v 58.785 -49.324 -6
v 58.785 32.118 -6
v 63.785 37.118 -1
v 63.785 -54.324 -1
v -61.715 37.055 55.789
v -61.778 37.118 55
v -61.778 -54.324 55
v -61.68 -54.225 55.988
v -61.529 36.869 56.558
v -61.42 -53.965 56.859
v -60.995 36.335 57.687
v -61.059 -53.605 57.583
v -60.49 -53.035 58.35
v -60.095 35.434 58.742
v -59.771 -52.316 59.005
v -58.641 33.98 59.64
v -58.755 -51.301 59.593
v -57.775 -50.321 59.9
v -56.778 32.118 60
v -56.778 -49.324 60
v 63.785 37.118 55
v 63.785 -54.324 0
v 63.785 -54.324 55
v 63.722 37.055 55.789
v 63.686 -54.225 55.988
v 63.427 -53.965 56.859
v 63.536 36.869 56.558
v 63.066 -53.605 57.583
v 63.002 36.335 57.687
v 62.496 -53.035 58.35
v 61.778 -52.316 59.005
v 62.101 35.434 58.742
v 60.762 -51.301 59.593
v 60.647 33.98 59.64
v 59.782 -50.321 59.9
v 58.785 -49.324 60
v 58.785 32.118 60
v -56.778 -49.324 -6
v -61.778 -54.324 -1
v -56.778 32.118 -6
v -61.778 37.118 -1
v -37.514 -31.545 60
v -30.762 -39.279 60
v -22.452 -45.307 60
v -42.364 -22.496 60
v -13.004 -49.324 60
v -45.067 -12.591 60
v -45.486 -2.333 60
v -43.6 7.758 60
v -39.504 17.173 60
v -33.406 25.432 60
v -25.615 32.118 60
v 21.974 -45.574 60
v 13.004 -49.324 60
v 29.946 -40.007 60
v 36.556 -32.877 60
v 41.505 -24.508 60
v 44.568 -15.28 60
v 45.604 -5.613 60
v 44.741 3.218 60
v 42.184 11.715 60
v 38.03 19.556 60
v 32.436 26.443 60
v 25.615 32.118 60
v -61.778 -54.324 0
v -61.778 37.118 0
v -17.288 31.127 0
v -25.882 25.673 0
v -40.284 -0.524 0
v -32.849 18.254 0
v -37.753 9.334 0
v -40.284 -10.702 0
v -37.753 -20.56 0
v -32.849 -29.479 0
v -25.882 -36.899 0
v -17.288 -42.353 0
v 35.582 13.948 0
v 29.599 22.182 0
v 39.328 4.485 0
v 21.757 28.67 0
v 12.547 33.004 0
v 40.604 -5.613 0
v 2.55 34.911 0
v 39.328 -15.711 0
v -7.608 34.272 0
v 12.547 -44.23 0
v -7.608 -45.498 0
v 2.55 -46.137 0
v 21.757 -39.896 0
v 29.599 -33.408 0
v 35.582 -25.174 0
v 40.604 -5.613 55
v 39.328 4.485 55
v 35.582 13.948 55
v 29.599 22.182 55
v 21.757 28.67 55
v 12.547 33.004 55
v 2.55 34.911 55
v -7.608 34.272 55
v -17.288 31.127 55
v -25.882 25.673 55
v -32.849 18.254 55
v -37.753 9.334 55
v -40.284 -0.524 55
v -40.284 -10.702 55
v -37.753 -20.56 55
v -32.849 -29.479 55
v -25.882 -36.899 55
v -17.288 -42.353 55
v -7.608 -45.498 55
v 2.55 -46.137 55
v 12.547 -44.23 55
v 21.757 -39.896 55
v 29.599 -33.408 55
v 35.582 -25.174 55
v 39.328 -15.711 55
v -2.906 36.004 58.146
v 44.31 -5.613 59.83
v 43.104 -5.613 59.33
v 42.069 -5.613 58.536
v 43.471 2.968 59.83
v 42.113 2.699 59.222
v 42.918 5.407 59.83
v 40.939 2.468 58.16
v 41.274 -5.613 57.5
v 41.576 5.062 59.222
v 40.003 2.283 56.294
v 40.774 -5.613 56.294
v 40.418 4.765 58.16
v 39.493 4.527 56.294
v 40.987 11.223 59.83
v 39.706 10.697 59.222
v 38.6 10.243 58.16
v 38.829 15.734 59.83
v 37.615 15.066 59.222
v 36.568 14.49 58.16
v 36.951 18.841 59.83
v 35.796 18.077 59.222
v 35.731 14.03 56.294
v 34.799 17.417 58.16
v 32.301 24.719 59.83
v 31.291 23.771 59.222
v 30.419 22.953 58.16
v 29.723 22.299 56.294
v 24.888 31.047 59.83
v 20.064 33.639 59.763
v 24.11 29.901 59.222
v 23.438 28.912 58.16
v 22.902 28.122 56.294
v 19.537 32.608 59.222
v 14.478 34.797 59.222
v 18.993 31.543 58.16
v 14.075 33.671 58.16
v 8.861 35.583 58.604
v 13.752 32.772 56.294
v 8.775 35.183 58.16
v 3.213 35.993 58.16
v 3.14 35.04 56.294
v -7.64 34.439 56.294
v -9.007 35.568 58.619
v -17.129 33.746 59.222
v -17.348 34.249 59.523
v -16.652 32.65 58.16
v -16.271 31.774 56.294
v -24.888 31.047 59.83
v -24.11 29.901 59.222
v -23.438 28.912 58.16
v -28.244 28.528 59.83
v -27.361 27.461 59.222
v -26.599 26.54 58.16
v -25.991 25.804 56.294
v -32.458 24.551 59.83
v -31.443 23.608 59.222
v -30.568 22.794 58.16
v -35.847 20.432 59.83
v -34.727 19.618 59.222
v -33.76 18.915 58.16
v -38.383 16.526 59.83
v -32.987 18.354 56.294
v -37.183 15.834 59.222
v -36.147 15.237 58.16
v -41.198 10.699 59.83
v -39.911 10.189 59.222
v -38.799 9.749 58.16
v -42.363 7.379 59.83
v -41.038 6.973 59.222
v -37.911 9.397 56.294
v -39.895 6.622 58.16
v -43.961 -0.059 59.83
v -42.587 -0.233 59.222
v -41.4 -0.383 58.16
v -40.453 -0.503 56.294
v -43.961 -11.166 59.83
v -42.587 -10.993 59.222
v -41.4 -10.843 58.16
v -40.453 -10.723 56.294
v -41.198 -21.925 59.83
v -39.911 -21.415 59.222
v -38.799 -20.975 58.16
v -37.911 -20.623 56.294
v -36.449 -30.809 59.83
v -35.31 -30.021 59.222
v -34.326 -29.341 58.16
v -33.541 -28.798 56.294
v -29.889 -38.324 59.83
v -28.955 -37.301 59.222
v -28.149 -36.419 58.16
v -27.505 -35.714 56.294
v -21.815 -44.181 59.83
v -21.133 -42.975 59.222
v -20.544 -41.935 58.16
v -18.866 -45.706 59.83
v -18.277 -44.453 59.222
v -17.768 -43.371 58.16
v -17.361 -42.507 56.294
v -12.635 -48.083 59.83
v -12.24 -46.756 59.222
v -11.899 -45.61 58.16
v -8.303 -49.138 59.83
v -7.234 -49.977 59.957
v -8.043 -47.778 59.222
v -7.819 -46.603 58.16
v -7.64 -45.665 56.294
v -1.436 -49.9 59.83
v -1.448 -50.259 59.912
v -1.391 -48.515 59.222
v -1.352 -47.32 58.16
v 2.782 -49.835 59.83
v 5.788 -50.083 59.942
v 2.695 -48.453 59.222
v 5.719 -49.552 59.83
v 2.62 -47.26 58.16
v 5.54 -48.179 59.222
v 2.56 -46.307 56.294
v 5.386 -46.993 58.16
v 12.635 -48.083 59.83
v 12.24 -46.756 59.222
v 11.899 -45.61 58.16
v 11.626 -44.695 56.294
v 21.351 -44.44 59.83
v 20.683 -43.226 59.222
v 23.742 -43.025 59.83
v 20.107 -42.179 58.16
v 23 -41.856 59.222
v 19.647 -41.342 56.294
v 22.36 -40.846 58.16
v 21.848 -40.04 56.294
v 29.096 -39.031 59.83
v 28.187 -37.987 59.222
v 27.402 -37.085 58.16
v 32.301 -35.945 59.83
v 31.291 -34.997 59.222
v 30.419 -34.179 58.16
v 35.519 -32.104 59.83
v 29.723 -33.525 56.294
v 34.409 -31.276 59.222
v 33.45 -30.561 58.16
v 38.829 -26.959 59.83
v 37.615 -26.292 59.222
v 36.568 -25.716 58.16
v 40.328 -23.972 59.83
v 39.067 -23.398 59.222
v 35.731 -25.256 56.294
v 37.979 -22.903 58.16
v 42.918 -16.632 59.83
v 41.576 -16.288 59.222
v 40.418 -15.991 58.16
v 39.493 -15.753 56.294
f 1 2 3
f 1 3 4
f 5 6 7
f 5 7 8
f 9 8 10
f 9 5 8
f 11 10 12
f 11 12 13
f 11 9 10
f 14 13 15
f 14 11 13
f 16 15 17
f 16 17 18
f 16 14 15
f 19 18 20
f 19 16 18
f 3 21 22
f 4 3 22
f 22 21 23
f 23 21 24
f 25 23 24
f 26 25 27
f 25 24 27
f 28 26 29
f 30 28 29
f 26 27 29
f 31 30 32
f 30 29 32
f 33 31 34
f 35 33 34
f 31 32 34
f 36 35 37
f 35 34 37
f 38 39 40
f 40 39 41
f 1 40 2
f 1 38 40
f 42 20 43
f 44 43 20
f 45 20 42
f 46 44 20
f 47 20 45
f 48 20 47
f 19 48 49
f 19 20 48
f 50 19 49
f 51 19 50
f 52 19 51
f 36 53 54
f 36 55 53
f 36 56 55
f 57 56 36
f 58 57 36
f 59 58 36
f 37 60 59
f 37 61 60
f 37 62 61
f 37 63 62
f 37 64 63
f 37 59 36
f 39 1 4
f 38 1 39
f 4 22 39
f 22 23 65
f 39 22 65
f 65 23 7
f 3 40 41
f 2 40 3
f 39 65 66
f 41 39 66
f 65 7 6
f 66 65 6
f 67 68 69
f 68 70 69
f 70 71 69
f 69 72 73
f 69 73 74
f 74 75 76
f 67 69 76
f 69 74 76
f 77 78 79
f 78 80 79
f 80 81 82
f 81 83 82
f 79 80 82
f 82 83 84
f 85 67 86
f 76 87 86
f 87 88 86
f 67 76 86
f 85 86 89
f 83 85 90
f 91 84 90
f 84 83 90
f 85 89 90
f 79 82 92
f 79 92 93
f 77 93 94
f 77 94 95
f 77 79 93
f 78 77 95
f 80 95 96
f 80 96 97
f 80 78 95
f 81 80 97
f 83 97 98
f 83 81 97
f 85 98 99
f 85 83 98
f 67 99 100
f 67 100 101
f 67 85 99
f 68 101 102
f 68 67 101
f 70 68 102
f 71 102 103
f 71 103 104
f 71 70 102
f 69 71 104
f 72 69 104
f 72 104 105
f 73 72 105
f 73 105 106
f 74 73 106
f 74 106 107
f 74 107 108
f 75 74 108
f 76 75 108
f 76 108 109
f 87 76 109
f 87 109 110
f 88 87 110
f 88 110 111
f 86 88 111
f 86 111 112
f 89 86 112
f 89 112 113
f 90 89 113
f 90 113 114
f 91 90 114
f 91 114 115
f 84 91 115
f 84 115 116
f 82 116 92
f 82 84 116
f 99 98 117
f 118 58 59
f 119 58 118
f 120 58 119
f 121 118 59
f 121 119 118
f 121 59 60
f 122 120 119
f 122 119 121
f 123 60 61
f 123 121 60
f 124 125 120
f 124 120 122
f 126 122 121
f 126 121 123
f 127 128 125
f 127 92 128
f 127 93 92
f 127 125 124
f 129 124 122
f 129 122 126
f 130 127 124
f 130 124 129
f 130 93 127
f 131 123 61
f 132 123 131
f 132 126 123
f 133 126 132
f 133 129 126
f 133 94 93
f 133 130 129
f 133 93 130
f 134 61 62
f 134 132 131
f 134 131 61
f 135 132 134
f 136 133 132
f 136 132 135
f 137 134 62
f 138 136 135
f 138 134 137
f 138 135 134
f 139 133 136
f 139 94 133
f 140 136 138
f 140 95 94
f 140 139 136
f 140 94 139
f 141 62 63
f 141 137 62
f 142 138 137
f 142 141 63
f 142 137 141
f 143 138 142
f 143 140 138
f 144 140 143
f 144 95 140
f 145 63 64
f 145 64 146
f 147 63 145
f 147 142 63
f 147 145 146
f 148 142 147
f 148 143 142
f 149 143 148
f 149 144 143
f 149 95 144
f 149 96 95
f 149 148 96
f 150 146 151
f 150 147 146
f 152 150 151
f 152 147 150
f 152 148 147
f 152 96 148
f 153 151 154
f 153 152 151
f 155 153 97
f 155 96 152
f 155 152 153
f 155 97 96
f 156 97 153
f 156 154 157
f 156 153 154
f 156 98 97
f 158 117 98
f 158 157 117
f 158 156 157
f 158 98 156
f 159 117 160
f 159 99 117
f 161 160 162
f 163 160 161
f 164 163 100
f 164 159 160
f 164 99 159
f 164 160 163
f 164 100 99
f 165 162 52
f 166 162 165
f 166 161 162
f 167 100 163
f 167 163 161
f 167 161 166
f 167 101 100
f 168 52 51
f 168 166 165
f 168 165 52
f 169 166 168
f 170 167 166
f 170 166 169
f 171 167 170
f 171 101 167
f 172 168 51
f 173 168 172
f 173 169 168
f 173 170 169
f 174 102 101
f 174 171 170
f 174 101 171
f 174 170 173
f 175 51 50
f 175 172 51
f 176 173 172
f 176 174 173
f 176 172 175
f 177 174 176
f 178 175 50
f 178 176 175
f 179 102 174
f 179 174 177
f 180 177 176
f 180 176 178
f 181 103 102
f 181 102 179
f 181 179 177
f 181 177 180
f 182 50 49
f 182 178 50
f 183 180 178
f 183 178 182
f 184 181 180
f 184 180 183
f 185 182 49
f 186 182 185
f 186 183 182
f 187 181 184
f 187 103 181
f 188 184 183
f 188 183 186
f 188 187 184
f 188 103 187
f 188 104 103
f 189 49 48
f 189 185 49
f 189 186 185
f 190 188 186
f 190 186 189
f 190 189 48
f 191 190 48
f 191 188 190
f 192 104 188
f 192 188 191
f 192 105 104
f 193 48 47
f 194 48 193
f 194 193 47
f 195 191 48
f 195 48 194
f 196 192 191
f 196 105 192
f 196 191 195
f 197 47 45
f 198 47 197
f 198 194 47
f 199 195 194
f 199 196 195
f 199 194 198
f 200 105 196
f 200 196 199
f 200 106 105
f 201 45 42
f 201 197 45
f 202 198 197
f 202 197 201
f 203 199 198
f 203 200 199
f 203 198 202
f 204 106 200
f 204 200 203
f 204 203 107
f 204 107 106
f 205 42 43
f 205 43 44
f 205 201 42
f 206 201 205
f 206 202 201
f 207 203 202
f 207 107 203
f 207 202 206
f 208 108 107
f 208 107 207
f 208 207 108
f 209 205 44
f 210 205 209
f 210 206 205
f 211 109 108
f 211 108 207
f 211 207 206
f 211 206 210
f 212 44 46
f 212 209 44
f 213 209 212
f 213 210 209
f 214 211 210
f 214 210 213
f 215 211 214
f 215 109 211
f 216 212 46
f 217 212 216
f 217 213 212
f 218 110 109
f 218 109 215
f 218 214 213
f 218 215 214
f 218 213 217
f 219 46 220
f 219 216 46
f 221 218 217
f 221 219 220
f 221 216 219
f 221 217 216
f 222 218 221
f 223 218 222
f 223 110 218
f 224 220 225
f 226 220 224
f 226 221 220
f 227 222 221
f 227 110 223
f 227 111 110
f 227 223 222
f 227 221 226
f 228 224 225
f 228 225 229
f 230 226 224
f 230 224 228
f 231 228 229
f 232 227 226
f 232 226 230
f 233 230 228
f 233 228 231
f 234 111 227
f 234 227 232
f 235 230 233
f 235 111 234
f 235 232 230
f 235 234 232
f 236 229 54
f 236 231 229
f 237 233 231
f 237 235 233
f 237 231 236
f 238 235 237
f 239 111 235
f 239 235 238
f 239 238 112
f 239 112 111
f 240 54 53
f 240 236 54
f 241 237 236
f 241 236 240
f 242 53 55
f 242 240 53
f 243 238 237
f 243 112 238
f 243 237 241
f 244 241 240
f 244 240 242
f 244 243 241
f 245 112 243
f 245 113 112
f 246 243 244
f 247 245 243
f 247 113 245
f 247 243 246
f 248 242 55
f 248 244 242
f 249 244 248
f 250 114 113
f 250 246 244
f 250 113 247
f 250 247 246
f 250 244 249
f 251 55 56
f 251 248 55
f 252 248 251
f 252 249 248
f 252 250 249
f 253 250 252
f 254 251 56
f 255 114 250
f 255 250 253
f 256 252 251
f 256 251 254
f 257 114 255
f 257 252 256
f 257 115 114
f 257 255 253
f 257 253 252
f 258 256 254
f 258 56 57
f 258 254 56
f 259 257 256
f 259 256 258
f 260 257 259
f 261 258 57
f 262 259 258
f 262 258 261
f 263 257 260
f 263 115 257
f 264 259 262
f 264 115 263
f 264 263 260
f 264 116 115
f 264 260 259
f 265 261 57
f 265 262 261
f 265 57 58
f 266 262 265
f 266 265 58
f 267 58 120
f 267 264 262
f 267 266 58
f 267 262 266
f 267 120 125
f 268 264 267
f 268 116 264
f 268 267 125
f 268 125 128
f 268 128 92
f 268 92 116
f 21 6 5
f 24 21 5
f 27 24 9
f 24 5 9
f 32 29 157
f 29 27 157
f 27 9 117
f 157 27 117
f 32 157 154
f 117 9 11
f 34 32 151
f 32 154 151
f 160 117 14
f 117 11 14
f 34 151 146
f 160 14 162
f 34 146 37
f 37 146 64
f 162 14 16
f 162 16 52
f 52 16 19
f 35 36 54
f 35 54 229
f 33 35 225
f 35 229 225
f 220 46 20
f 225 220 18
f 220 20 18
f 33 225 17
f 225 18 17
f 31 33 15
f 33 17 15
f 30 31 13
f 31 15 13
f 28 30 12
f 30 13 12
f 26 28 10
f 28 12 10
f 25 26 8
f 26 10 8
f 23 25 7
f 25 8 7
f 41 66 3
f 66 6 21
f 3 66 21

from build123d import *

# Parameters (mm, degrees)
F0_W        = 125.5629397929
F0_H        = 91.4415977895
F0_R        = 40.6040371895
F1_DEPTH    = 60
F2_W        = 118.2770989835
F2_H        = 87.5040702522
F3_DEPTH    = 6
F4_T1_DEPTH = 150.5629397929
F4_T3_DEPTH = 116.4415977895
F5_SIZE     = 5


# Not quite as in the source:
# - a fillet or chamfer that OpenCascade refuses, or shapes differently, is made with other operations: its cross-section is extruded or revolved along the edge and cut away or added


with BuildPart() as f1:
    # F0 (on Top) → F1 (new body)
    with BuildSketch(Plane.XY):
        with Locations((1.0034125298, -8.6029302329)):
            Rectangle(F0_W, F0_H)
        with Locations((0, -5.6129307486)):
            Circle(F0_R, mode=Mode.SUBTRACT)
    extrude(amount=F1_DEPTH)

    # F2 (on face) → F3 (join)
    with BuildSketch(Plane(origin=(0, 0, 0), x_dir=(1, 0, 0), z_dir=(0, 0, -1))):
        Polygon((63.7848824263, -37.1178686619), (63.7848824263, 54.3237291276), (-61.7780573666, 54.3237291276), (-61.7780573666, -37.1178686619), (-58.5906021297, -37.1178686619), (-58.5906021297, 50.3862015903), (59.6864968538, 50.3862015903), (59.6864968538, -37.1178686619), align=None)
        with Locations((0.5479473621, 6.6341664642)):
            Rectangle(F2_W, F2_H)
    extrude(amount=F3_DEPTH)

    # F4: fillet of radius 5 on 5 edges, made by hand

    # F4_s2 → F4_t1 (cut)
    with BuildSketch(Plane.YZ.offset(-74.2780573666)):
        with BuildLine():
            ThreePointArc((37.1178686619, 55), (35.6534025678, 58.5355339059), (32.1178686619, 60))
            Line((32.1178686619, 60), (37.1178686619, 60))
            Line((37.1178686619, 60), (37.1178686619, 55))
        make_face()
        with BuildLine():
            ThreePointArc((-49.3237291276, 60), (-52.8592630336, 58.5355339059), (-54.3237291276, 55))
            Line((-54.3237291276, 55), (-54.3237291276, 60))
            Line((-54.3237291276, 60), (-49.3237291276, 60))
        make_face()
    extrude(amount=F4_T1_DEPTH, mode=Mode.SUBTRACT)

    # F4_s4 → F4_t3 (cut)
    with BuildSketch(Plane.XZ.offset(-49.6178686619)):
        with BuildLine():
            ThreePointArc((63.7848824263, 55), (62.3204163322, 58.5355339059), (58.7848824263, 60))
            Line((58.7848824263, 60), (63.7848824263, 60))
            Line((63.7848824263, 60), (63.7848824263, 55))
        make_face()
        with BuildLine():
            ThreePointArc((-61.7780573666, 55), (-60.3135912725, 58.5355339059), (-56.7780573666, 60))
            Line((-56.7780573666, 60), (-61.7780573666, 60))
            Line((-61.7780573666, 60), (-61.7780573666, 55))
        make_face()
    extrude(amount=F4_T3_DEPTH, mode=Mode.SUBTRACT)

    # F4_s5 → F4_t6 (revolve, cut)
    with BuildSketch(Plane.XZ.offset(5.6129307486)):
        with BuildLine():
            ThreePointArc((45.6040371895, 60), (42.0685032836, 58.5355339059), (40.6040371895, 55))
            Line((40.6040371895, 55), (40.6040371895, 60))
            Line((40.6040371895, 60), (45.6040371895, 60))
        make_face()
    revolve(axis=Axis((0, -5.6129307486, 60), (0, 0, 1)), mode=Mode.SUBTRACT)

    # F5
    f5_edges = [f1.edges().sort_by_distance(p)[0] for p in [
        (1.003413, 37.117869, -6),
        (63.784882, -8.60293, -6),
        (1.003413, -54.323729, -6),
        (-61.778057, -8.60293, -6),
    ]]
    chamfer(f5_edges, length=F5_SIZE)


solid = f1.part
